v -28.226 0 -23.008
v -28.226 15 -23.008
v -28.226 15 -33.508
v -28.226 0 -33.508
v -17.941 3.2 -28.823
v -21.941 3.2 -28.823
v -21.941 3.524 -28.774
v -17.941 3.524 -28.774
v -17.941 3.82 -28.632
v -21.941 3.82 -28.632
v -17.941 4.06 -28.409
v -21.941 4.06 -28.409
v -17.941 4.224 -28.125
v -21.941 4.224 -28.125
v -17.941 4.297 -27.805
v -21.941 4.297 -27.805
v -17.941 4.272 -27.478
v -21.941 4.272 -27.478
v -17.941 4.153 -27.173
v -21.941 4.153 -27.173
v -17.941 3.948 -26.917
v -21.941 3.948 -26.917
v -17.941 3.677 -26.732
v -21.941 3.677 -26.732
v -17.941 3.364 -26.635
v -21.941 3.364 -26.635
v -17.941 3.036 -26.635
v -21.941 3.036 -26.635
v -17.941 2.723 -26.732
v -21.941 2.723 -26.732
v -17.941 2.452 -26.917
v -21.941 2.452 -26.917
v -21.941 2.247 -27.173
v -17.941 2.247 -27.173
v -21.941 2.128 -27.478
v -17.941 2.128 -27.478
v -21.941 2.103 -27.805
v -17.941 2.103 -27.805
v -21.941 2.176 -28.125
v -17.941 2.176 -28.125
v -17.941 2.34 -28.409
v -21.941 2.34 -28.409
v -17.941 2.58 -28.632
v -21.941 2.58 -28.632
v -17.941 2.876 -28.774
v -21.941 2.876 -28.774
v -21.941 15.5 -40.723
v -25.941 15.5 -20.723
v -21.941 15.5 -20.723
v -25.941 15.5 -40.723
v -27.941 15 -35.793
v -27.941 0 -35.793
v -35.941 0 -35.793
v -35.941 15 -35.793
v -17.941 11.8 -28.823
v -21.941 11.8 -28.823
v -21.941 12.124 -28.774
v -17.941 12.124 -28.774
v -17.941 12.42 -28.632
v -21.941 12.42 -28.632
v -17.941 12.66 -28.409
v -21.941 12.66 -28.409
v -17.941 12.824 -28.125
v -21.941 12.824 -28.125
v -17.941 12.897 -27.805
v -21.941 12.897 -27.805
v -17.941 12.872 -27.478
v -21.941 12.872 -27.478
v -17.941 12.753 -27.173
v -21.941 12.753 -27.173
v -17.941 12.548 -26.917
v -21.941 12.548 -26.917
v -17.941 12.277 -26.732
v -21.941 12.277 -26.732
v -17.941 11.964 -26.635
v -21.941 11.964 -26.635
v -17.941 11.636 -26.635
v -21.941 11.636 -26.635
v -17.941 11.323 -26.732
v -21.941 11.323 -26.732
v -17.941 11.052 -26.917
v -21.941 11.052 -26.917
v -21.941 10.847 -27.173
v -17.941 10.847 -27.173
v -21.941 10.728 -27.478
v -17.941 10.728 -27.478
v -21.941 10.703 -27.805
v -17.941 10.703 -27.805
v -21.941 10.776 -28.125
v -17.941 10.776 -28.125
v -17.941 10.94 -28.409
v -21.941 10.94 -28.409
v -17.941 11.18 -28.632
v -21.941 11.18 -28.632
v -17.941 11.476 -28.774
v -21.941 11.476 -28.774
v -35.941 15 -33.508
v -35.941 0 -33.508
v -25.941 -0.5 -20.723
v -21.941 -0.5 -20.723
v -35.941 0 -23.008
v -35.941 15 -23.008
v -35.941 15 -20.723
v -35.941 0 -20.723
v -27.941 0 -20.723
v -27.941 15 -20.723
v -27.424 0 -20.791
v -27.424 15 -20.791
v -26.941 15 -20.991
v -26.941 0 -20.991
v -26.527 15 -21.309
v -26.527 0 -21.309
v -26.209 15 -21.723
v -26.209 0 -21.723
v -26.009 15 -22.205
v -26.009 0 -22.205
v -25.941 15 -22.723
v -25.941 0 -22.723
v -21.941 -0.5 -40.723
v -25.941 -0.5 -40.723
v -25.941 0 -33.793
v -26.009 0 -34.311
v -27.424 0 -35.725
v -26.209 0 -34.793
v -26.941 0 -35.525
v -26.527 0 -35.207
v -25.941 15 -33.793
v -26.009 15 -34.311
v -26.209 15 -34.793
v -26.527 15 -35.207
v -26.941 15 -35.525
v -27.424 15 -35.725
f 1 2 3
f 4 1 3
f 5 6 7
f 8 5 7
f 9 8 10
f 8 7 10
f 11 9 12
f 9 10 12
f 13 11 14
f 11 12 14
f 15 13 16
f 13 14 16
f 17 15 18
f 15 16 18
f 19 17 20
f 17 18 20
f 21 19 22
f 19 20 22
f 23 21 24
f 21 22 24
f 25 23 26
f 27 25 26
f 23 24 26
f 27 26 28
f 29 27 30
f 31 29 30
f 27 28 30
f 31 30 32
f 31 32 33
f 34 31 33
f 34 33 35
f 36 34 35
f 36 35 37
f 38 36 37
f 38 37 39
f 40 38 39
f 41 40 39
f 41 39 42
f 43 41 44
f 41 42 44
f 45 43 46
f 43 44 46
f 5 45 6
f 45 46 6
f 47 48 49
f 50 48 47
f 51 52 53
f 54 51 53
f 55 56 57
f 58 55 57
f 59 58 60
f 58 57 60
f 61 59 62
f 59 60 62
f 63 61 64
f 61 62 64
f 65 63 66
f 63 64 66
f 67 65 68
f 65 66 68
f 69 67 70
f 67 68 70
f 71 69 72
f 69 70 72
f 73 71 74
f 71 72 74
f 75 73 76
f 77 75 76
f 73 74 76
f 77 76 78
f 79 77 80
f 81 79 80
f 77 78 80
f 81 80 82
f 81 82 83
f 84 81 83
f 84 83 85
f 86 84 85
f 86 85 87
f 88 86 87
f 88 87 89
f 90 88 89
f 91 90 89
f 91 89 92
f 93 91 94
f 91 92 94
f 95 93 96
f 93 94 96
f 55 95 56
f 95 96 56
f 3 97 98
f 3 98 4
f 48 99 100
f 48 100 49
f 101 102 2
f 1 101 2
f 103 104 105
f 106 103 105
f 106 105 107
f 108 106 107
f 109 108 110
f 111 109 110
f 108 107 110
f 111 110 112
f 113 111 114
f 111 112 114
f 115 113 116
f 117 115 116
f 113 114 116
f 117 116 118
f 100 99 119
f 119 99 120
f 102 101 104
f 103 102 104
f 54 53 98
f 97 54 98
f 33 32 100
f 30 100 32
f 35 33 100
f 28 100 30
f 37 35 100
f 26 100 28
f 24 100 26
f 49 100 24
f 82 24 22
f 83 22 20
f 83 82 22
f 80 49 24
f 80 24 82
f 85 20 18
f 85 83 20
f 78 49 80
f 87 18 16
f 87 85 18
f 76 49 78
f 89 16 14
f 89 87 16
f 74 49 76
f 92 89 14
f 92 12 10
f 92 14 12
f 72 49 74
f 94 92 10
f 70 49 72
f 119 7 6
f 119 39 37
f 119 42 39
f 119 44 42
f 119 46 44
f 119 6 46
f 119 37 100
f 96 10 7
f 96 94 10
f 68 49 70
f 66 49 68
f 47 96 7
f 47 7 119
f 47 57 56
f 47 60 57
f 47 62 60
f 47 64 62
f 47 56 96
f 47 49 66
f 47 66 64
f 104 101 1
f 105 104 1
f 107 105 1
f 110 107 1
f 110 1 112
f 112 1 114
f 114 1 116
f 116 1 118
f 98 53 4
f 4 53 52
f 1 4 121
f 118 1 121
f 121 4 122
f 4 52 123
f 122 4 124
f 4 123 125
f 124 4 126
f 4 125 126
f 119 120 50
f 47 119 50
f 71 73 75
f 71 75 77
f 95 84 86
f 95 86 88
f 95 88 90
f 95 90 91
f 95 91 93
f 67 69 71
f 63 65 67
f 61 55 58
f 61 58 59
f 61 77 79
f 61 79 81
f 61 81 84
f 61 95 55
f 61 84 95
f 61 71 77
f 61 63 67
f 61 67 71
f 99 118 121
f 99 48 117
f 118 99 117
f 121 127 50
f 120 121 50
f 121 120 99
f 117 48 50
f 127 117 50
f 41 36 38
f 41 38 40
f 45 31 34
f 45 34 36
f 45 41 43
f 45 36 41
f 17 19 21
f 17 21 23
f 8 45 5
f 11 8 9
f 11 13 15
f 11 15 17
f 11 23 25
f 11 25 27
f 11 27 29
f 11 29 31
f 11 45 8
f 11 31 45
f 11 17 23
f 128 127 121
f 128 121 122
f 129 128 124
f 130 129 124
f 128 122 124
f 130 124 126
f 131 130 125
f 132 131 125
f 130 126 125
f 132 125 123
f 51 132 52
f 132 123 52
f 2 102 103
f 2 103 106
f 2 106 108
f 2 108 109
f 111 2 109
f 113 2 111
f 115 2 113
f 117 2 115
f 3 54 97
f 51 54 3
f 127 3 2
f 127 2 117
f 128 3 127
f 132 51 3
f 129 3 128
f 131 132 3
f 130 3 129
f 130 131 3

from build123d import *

# Parameters (mm, degrees)
EXTRUDE_4_DEPTH     = 15
SKETCH_6_W          = 5.43
SKETCH_6_H          = 10.5
CUT_EXTRUDE_2_DEPTH = 15
SKETCH_7_W          = 2.285
SKETCH_7_H          = 10.5
CUT_EXTRUDE_3_DEPTH = 15
SKETCH_8_W          = 20
SKETCH_8_H          = 16
EXTRUDE_5_DEPTH     = 4
SKETCH_9_R          = 1.1
EXTRUDE_6_DEPTH     = 4


with BuildPart() as part:
    # 草图1 → 凸台-拉伸4 (new body)
    with BuildSketch(Plane(origin=(0, 0, 0), x_dir=(1, 0, 0), z_dir=(0, 1, 0))):
        with BuildLine():
            Line((-35.94125392, 35.792894198), (-35.94125392, 20.722894198))
            Line((-35.94125392, 20.722894198), (-27.94125392, 20.722894198))
            ThreePointArc((-27.94125392, 20.722894198), (-26.527040358, 21.308680636), (-25.94125392, 22.722894198))
            Line((-25.94125392, 22.722894198), (-25.94125392, 33.792894198))
            ThreePointArc((-25.94125392, 33.792894198), (-26.527040358, 35.207107761), (-27.94125392, 35.792894198))
            Line((-27.94125392, 35.792894198), (-35.94125392, 35.792894198))
        make_face()
    extrude(amount=EXTRUDE_4_DEPTH)

    # 草图6 → 切除-拉伸2 (cut)
    with BuildSketch(Plane(origin=(0, 15, 0), x_dir=(1, 0, 0), z_dir=(0, 1, 0))):
        with Locations((-30.94125392, 28.257894198)):
            Rectangle(SKETCH_6_W, SKETCH_6_H)
    extrude(amount=-CUT_EXTRUDE_2_DEPTH, mode=Mode.SUBTRACT)

    # 草图7 → 切除-拉伸3 (cut)
    with BuildSketch(Plane(origin=(0, 15, 0), x_dir=(1, 0, 0), z_dir=(0, 1, 0))):
        with Locations((-34.79875392, 28.257894198)):
            Rectangle(SKETCH_7_W, SKETCH_7_H)
    extrude(amount=-CUT_EXTRUDE_3_DEPTH, mode=Mode.SUBTRACT)

    # 草图8 → 凸台-拉伸5 (add)
    with BuildSketch(Plane(origin=(-25.94125392, 0, 0), x_dir=(0, 0, -1), z_dir=(1, 0, 0))):
        with Locations((30.722894198, 7.5)):
            Rectangle(SKETCH_8_W, SKETCH_8_H)
    extrude(amount=EXTRUDE_5_DEPTH)

    # 草图9 → 凸台-拉伸6 (add)
    with BuildSketch(Plane(origin=(-21.94125392, 0, 0), x_dir=(0, 0, -1), z_dir=(1, 0, 0))):
        with Locations((27.722894198, 11.8)):
            Circle(SKETCH_9_R)
        with Locations((27.722894198, 3.2)):
            Circle(SKETCH_9_R)
    extrude(amount=EXTRUDE_6_DEPTH)


solid = part.part
